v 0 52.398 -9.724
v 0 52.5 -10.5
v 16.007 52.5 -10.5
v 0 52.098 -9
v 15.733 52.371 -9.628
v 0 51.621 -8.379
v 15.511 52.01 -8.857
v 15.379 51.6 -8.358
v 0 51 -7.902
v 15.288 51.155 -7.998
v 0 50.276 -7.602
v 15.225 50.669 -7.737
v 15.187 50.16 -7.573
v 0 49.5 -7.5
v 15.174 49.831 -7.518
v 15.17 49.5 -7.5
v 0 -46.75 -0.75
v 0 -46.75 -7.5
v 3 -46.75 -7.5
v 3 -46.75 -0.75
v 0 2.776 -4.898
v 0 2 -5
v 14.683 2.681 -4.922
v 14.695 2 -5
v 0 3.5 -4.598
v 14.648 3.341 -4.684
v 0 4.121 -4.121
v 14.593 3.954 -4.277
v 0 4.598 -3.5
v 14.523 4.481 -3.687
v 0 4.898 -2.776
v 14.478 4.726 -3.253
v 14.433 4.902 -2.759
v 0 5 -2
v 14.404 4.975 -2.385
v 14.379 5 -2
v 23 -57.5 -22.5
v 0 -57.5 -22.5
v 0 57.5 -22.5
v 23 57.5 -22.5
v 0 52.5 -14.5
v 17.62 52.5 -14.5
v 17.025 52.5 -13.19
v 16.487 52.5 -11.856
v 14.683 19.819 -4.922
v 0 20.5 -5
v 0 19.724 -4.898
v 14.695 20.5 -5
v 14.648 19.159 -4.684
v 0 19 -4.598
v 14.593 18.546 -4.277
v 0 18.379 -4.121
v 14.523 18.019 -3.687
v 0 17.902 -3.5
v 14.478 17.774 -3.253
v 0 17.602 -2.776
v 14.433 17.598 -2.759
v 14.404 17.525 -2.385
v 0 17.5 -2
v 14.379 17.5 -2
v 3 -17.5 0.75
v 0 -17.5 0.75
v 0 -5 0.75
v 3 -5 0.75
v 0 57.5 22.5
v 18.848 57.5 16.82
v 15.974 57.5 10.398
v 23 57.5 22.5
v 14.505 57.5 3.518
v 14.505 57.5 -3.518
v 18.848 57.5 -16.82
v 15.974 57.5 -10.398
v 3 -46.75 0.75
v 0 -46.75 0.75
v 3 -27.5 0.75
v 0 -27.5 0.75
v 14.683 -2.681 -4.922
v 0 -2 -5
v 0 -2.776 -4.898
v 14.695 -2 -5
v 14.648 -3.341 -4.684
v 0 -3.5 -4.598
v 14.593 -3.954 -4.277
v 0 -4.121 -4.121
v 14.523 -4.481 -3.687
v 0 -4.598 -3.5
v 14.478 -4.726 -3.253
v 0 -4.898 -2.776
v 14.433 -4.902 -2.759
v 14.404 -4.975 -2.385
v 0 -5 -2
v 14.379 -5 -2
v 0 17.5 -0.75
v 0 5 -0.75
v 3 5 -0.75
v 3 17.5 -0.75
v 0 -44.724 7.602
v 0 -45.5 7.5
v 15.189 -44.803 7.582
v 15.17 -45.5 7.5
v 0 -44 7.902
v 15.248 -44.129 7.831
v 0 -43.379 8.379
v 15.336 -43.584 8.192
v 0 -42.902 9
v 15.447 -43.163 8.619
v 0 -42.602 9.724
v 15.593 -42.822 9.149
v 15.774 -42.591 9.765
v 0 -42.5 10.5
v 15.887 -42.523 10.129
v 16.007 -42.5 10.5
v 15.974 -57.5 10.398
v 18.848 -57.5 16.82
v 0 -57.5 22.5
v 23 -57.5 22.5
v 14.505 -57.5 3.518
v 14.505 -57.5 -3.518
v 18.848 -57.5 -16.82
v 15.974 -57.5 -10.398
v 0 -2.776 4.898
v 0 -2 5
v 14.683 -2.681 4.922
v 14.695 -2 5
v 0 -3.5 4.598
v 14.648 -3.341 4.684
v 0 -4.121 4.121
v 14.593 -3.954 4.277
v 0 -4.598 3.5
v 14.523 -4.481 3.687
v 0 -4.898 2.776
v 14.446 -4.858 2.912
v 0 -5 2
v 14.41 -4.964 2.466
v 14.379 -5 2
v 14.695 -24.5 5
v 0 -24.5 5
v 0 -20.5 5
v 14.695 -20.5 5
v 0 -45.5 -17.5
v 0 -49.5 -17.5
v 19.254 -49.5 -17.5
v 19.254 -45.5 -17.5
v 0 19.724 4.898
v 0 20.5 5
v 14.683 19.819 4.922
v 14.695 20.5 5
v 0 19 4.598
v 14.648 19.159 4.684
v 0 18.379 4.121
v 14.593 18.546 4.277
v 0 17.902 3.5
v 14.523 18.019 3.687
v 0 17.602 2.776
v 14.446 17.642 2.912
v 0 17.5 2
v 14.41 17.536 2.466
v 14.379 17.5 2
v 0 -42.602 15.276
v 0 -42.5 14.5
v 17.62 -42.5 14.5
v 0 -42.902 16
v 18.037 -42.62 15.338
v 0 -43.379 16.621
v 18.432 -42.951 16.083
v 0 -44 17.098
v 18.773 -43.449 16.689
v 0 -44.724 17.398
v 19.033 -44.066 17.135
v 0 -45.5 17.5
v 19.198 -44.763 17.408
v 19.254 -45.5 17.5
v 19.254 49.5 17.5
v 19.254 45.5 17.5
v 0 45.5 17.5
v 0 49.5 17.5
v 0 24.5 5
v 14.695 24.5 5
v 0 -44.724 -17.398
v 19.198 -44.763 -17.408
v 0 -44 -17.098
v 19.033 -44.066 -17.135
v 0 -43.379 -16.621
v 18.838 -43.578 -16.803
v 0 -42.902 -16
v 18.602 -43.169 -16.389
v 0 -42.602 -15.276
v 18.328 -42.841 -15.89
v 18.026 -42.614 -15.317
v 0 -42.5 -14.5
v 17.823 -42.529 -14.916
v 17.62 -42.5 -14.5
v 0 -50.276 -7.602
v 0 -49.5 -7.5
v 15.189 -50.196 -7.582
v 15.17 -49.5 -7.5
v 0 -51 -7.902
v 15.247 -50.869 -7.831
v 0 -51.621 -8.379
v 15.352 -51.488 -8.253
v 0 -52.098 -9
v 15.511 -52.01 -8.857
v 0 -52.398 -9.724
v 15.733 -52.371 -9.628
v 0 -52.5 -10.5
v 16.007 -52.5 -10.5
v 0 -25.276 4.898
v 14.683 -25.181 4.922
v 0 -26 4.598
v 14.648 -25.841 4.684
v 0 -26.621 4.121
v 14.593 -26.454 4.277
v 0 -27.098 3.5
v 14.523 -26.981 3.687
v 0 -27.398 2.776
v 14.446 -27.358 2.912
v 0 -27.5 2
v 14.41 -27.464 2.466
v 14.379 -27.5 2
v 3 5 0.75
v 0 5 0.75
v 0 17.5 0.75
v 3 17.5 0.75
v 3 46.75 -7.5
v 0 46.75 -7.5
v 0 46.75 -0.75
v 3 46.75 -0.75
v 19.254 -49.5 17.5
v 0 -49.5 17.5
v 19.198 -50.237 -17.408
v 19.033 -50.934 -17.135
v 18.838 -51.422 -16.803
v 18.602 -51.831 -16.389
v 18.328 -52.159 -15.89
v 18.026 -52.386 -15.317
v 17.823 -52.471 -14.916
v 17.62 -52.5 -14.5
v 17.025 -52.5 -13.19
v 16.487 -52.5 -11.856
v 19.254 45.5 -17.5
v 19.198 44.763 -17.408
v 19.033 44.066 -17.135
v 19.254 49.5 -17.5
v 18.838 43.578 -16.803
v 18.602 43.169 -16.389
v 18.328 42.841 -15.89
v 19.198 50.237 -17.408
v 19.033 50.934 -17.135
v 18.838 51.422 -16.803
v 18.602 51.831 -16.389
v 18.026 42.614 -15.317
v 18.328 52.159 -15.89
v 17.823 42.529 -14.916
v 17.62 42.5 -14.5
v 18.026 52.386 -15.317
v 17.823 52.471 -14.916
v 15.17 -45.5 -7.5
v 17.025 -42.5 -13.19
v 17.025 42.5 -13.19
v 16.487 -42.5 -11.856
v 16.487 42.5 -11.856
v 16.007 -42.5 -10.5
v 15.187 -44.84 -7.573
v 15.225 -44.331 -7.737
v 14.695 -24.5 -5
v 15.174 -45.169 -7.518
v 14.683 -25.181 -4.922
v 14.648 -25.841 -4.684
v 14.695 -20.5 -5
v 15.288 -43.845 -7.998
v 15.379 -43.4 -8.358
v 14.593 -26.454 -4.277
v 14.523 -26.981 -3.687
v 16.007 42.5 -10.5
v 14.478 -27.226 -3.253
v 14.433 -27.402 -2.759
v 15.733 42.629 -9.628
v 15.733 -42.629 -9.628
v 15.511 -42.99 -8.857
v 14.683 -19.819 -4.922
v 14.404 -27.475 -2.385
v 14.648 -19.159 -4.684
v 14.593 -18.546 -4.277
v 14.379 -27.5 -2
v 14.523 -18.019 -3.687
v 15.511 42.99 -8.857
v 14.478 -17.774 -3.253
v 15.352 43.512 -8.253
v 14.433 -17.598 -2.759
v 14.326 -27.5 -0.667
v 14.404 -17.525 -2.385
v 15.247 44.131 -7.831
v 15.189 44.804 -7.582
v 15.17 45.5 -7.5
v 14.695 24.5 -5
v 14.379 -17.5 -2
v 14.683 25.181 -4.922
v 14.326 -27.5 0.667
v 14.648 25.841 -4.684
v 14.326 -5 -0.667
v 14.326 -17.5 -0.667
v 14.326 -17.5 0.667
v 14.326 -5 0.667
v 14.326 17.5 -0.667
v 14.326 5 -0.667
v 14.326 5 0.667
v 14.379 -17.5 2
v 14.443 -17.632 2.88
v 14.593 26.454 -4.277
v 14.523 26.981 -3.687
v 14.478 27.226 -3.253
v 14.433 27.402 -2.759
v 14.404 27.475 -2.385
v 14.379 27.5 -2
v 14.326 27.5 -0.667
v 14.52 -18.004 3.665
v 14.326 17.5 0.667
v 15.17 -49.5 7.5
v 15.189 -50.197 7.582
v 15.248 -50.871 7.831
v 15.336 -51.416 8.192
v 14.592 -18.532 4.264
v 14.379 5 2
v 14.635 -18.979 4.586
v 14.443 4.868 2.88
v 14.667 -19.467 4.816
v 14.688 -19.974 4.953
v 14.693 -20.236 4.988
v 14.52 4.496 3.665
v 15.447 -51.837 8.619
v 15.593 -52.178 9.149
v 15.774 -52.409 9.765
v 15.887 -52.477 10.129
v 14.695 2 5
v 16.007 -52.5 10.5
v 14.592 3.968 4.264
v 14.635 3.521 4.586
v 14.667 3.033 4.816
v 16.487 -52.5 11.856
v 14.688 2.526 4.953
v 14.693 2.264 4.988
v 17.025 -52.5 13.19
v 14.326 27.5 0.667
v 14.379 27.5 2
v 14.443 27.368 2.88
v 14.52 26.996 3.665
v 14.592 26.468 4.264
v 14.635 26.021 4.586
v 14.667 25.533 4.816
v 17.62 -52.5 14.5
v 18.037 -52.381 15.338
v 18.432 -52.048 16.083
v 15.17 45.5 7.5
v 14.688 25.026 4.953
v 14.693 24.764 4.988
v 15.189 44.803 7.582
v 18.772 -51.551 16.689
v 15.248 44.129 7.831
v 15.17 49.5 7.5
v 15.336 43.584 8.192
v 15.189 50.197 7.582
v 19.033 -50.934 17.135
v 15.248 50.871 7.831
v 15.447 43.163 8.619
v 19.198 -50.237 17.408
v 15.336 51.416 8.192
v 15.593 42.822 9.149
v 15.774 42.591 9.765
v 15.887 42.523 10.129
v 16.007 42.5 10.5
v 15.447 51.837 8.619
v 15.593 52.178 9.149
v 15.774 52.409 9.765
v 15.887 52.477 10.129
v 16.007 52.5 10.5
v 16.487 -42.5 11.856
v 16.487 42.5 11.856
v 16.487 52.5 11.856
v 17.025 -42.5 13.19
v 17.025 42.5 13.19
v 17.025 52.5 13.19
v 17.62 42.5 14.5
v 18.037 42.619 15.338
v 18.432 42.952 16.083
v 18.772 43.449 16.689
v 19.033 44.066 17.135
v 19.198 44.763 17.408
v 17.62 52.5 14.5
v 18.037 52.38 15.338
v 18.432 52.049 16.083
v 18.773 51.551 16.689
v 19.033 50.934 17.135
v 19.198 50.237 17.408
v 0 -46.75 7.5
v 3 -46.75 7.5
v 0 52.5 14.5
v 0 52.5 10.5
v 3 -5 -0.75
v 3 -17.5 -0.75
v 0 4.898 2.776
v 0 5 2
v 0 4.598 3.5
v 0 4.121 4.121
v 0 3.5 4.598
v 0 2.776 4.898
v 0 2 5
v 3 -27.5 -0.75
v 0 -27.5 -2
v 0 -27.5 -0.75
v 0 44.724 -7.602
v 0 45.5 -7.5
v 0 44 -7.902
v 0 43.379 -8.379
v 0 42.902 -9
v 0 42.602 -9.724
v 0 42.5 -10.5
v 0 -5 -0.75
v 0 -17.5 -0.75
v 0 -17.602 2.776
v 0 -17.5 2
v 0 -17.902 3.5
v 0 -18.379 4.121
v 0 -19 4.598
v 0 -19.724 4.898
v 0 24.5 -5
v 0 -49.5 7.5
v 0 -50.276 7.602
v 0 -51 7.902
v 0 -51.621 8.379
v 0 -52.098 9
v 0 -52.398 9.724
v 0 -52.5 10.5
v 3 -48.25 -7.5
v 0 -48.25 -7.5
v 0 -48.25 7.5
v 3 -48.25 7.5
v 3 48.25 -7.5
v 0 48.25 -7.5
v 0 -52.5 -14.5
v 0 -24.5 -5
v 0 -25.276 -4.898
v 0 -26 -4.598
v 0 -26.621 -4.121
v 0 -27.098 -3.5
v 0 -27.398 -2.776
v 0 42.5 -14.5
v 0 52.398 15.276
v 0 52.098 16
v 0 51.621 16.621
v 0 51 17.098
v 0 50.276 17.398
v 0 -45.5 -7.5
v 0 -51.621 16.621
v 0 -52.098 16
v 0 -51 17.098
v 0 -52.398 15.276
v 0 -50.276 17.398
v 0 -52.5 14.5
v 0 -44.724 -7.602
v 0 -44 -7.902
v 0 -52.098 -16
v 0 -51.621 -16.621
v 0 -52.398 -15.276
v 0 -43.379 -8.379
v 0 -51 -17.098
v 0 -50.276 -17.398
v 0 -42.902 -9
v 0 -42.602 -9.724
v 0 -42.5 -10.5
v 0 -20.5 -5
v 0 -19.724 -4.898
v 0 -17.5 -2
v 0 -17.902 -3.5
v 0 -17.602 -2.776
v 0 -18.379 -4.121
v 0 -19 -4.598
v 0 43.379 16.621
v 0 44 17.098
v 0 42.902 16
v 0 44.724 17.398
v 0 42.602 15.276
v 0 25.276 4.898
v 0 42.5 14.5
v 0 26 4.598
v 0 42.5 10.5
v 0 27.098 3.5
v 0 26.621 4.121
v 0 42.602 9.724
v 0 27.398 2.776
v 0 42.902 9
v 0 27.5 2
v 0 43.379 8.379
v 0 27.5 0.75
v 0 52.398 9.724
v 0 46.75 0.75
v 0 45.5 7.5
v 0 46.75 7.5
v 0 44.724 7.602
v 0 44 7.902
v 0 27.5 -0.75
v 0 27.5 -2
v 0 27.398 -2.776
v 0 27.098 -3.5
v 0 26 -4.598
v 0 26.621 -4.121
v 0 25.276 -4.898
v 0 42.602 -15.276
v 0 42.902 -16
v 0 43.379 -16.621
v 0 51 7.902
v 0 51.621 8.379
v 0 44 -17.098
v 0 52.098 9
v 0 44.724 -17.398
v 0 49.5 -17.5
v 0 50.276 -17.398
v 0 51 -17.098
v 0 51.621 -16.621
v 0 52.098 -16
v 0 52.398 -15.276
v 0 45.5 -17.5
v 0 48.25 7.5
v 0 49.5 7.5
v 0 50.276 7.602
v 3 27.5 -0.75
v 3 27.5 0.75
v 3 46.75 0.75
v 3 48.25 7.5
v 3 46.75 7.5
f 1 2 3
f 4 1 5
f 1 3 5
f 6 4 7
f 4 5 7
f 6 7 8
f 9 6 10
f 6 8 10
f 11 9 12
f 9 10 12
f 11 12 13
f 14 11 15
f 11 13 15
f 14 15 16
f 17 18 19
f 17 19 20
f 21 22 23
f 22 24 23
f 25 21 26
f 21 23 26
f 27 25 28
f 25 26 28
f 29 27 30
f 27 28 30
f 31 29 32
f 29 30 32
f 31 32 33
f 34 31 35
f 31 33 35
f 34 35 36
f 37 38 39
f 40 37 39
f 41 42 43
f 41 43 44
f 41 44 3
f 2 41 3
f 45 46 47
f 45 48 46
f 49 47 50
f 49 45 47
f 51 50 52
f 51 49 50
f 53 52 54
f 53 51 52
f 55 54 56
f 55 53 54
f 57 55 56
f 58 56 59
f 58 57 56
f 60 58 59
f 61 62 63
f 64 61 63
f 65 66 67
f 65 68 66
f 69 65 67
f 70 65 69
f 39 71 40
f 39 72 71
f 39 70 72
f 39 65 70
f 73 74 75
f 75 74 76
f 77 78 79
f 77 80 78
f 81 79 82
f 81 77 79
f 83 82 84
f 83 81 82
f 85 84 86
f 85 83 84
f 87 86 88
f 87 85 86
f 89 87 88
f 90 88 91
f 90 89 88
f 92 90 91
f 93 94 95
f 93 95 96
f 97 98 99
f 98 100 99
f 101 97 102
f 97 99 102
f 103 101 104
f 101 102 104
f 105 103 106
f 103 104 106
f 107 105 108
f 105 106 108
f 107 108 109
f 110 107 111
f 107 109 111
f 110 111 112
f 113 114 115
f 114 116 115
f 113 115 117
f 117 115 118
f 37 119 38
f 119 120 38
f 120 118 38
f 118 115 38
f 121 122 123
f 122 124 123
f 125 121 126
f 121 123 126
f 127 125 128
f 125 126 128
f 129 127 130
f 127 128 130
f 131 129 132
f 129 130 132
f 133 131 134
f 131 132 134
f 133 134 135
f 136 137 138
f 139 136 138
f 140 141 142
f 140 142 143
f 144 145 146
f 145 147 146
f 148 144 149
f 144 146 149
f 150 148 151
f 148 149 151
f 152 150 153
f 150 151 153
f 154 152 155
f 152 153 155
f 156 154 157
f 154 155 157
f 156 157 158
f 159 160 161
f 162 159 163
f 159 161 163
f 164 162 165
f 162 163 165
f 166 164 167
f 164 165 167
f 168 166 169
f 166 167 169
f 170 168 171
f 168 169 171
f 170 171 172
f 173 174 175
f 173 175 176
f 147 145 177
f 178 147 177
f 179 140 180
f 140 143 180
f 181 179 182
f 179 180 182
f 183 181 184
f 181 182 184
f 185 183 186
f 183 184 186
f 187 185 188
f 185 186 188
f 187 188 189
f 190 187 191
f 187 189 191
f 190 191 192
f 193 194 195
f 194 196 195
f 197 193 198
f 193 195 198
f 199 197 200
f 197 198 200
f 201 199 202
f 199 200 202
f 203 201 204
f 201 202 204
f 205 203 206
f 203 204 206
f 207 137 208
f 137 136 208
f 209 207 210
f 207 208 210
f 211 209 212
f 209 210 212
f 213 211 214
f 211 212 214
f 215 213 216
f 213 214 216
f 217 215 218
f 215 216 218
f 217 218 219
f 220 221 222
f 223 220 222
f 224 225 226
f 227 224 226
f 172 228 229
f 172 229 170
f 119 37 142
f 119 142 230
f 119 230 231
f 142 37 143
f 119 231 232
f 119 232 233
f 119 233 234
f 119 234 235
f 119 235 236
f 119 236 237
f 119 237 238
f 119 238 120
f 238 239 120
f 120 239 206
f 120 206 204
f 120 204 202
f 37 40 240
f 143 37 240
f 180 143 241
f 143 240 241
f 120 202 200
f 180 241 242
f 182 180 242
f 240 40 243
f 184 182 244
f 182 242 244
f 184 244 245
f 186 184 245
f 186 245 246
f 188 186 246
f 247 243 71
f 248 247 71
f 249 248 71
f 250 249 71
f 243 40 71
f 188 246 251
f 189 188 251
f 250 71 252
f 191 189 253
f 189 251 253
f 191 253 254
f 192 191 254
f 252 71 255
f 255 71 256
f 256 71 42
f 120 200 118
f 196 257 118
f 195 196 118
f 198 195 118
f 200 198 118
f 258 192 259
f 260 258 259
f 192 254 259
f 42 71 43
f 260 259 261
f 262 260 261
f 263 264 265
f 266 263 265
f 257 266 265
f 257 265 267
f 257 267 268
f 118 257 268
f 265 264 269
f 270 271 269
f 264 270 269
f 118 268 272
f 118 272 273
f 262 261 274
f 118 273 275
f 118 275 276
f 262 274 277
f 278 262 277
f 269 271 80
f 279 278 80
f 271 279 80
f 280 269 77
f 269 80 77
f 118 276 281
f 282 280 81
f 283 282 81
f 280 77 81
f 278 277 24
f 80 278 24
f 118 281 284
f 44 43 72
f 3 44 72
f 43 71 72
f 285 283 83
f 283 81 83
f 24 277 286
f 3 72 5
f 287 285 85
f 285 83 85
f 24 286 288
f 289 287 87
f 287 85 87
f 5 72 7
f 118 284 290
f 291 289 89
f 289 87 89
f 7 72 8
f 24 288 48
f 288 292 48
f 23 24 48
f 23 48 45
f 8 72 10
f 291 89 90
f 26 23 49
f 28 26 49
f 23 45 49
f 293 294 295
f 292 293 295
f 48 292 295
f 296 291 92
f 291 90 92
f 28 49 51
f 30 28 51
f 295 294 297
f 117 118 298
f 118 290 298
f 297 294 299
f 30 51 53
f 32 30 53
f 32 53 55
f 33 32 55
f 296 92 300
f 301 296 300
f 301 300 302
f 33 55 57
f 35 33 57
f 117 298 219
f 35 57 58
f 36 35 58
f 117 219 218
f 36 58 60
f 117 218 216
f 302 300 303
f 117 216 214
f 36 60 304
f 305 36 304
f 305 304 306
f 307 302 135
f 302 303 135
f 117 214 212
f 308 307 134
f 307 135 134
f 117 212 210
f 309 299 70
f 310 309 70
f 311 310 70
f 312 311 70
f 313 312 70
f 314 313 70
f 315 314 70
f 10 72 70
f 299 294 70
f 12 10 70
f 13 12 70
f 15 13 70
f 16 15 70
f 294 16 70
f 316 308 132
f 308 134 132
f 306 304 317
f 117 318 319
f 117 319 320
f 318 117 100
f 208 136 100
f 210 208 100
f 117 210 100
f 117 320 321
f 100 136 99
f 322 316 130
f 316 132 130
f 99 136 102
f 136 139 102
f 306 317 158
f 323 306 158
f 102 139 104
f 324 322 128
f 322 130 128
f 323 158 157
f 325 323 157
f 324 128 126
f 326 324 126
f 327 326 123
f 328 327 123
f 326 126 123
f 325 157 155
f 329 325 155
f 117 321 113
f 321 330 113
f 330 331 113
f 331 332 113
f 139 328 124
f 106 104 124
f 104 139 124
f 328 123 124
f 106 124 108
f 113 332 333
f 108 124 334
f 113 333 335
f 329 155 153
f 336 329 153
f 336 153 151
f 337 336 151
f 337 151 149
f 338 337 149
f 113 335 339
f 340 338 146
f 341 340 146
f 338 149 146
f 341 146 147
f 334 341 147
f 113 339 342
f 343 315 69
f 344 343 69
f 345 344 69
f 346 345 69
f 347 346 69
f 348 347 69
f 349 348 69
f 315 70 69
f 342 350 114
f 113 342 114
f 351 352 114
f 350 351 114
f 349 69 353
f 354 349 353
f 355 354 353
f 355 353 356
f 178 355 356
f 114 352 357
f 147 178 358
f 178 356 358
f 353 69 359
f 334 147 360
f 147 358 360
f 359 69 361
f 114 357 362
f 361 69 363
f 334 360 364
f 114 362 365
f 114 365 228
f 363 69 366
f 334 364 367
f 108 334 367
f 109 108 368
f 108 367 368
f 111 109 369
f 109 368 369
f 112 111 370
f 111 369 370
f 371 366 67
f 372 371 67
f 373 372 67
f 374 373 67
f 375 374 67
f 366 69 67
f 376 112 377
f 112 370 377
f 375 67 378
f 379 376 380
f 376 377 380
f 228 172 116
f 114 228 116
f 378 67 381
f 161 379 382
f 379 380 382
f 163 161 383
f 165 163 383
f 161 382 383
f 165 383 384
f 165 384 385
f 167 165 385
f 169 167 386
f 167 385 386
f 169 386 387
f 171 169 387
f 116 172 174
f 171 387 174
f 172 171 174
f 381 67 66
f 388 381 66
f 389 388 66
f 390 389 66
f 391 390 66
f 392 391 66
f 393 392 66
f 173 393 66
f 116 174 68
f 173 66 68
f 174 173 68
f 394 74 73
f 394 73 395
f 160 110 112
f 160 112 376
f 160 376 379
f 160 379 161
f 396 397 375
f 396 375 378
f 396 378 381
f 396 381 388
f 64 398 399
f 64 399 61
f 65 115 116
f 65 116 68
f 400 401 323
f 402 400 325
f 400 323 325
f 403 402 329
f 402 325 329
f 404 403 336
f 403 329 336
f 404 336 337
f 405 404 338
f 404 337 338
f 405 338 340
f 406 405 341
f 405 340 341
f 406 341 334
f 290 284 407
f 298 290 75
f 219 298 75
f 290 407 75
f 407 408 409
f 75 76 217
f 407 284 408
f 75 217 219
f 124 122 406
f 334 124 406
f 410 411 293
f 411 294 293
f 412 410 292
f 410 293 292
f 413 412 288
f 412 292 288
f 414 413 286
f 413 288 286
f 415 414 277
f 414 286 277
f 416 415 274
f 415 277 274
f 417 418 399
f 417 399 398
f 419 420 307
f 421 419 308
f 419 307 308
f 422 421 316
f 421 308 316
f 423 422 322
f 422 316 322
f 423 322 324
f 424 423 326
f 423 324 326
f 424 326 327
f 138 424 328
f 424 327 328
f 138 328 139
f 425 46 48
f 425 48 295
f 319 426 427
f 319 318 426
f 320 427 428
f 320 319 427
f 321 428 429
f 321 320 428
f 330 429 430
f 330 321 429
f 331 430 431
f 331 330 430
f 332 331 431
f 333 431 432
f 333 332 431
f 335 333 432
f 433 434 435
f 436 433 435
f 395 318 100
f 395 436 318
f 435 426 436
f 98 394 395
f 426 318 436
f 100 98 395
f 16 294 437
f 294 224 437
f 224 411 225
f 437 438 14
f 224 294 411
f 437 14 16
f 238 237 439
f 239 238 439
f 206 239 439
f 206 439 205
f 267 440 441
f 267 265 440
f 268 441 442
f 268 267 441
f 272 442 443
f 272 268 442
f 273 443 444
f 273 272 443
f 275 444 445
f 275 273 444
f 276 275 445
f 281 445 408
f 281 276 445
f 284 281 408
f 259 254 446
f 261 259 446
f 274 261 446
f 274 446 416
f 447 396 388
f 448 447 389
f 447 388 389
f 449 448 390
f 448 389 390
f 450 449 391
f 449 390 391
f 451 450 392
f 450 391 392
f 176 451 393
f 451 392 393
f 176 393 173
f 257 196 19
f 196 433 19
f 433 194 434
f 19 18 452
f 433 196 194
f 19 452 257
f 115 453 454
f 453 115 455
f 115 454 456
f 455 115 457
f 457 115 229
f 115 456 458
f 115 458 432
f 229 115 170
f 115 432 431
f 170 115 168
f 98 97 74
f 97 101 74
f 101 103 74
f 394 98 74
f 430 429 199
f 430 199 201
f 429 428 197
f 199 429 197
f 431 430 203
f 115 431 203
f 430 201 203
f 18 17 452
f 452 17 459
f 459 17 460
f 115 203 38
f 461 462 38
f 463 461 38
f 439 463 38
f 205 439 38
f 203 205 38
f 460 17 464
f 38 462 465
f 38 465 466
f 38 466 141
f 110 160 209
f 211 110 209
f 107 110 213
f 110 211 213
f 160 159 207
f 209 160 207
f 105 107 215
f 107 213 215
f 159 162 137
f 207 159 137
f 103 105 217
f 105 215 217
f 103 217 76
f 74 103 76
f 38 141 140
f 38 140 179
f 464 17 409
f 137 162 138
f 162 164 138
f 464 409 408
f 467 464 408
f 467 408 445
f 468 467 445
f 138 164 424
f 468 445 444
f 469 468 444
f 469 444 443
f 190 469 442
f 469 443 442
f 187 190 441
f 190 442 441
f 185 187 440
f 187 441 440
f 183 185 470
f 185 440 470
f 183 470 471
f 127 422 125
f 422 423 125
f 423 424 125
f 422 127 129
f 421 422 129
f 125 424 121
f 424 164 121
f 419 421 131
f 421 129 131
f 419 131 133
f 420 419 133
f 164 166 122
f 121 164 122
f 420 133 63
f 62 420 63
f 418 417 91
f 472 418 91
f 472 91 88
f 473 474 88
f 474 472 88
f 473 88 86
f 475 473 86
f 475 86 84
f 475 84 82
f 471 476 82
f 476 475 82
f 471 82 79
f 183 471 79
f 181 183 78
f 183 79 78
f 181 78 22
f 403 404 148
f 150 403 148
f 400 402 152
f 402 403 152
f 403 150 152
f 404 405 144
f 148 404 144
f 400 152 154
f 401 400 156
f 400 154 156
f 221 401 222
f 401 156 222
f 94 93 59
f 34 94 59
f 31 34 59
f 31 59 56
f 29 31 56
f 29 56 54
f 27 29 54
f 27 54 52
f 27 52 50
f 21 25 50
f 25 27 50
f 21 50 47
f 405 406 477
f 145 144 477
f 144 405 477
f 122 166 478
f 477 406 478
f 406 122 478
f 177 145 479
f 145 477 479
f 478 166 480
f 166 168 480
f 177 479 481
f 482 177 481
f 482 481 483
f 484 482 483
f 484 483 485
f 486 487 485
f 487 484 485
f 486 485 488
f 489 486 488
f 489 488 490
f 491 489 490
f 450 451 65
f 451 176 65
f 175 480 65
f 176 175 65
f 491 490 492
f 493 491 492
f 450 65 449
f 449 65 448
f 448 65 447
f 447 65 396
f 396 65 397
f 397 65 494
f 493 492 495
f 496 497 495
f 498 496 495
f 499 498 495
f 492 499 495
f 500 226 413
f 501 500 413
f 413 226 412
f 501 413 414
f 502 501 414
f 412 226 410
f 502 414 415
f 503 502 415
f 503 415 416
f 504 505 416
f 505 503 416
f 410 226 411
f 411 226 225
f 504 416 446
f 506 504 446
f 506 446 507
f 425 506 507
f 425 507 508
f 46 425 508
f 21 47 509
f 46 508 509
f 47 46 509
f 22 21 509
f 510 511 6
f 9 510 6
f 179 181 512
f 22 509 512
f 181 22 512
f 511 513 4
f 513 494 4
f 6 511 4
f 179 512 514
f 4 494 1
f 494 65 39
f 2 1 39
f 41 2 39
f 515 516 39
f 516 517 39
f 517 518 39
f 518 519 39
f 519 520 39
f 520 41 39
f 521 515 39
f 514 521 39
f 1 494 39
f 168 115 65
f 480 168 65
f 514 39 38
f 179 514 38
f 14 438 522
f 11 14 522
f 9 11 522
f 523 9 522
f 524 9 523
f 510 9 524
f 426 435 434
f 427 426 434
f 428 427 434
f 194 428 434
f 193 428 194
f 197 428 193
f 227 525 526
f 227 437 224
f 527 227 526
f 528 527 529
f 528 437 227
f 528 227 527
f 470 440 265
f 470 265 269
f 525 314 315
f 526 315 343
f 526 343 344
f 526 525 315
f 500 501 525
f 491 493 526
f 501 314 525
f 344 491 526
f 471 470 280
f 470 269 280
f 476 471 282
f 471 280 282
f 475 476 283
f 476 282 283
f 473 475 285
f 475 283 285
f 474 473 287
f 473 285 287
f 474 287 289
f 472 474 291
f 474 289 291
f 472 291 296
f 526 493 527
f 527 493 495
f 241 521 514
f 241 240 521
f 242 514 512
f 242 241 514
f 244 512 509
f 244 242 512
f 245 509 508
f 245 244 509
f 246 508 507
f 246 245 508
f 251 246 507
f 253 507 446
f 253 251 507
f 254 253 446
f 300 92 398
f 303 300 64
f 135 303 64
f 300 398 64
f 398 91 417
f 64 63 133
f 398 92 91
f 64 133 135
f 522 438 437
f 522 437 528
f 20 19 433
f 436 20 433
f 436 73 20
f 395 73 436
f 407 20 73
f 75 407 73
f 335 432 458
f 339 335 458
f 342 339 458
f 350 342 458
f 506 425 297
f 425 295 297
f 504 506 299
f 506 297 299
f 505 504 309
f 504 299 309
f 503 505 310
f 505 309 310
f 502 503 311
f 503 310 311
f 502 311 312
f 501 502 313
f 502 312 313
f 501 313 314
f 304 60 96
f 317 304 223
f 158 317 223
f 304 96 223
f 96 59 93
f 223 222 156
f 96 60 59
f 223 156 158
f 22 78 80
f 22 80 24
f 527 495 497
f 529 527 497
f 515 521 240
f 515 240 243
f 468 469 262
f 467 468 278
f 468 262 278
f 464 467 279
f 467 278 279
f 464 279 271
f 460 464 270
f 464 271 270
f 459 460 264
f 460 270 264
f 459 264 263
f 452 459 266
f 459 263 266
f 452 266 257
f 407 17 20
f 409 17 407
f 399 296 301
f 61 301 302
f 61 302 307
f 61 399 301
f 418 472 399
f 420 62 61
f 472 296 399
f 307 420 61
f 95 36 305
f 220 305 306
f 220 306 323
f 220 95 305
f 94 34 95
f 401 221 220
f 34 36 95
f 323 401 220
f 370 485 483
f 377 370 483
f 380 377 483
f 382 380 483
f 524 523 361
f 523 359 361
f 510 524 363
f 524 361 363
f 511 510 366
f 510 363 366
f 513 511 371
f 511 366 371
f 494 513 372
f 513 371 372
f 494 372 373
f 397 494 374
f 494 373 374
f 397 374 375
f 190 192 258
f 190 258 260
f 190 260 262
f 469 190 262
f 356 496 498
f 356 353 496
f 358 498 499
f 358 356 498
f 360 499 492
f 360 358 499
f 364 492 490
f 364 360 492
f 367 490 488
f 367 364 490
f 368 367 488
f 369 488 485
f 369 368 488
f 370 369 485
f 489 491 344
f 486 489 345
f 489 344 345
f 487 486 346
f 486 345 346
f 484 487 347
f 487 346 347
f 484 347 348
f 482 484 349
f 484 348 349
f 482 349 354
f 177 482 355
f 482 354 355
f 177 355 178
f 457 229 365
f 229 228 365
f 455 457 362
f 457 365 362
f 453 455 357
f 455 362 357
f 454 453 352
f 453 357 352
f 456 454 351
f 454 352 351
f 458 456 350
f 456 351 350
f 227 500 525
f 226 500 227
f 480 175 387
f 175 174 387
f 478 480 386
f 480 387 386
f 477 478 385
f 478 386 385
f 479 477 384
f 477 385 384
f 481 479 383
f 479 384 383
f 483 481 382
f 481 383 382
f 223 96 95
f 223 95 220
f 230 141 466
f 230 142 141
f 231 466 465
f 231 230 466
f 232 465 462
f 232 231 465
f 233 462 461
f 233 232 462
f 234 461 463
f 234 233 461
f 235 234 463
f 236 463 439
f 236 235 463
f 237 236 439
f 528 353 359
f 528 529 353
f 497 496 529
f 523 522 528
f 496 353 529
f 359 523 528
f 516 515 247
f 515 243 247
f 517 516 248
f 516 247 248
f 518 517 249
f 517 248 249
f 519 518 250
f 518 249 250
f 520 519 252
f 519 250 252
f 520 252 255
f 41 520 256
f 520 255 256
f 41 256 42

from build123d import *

# Parameters (mm, degrees)
SKETCH1_W           = 45
SKETCH1_H           = 115
BOSS_EXTRUDE1_DEPTH = 23
SKETCH2_R           = 33.5
CUT_EXTRUDE1_DEPTH  = 121
SKETCH3_W           = 10
SKETCH3_H           = 10
CUT_EXTRUDE3_DEPTH  = 31
FILLET2_R           = 3
FILLET3_R           = 3
SKETCH5_W           = 15
SKETCH5_H           = 1.5
SKETCH5_W_2         = 1.5
SKETCH5_H_2         = 12.5
SKETCH5_H_3         = 19.25
CUT_EXTRUDE4_DEPTH  = 3


with BuildPart() as part:
    # Sketch1 → Boss-Extrude1 (new body)
    with BuildSketch(Plane(origin=(0, 0, 0), x_dir=(0, 0, -1), z_dir=(1, 0, 0))):
        Rectangle(SKETCH1_W, SKETCH1_H)
    extrude(amount=BOSS_EXTRUDE1_DEPTH)

    # Sketch2 → Cut-Extrude1 (cut)
    with BuildSketch(Plane(origin=(0, 57.5, 0), x_dir=(1, 0, 0), z_dir=(0, 1, 0))):
        with Locations((47.819347292, 0)):
            Circle(SKETCH2_R)
    extrude(amount=-CUT_EXTRUDE1_DEPTH, mode=Mode.SUBTRACT)

    # Sketch3 → Cut-Extrude3 (cut)
    with BuildSketch(Plane.ZY):
        with Locations((12.5, -47.5)):
            Rectangle(SKETCH3_W, SKETCH3_H)
        with Locations((-12.5, -47.5)):
            Rectangle(SKETCH3_W, SKETCH3_H)
        with Locations((0, -22.5)):
            Rectangle(SKETCH3_W, SKETCH3_H)
        Rectangle(SKETCH3_W, SKETCH3_H)
        with Locations((0, 22.5)):
            Rectangle(SKETCH3_W, SKETCH3_H)
        with Locations((12.5, 47.5)):
            Rectangle(SKETCH3_W, SKETCH3_H)
        with Locations((-12.5, 47.5)):
            Rectangle(SKETCH3_W, SKETCH3_H)
    extrude(amount=-CUT_EXTRUDE3_DEPTH, mode=Mode.SUBTRACT)

    # Fillet2
    fillet2_edges = [part.edges().sort_by_distance(p)[0] for p in [
        (9.626816789, -42.5, 17.5),
        (9.626816789, -52.5, 17.5),
        (7.584845929, -42.5, 7.5),
        (7.584845929, 52.5, -7.5),
        (7.584845929, 42.5, -7.5),
        (9.626816789, 42.5, -17.5),
        (9.626816789, 52.5, -17.5),
        (9.626816789, 52.5, 17.5),
        (9.626816789, 42.5, 17.5),
        (7.584845929, 42.5, 7.5),
        (7.584845929, 52.5, 7.5),
        (7.347291571, 27.5, 5),
        (7.347291571, 17.5, 5),
        (7.347291571, 17.5, -5),
        (7.347291571, 27.5, -5),
        (7.347291571, 5, 5),
        (7.347291571, -5, 5),
        (7.347291571, -5, -5),
        (7.347291571, 5, -5),
        (7.347291571, -17.5, 5),
        (7.347291571, -27.5, 5),
        (7.347291571, -27.5, -5),
        (7.347291571, -17.5, -5),
        (7.584845929, -42.5, -7.5),
        (7.584845929, -52.5, -7.5),
        (9.626816789, -52.5, -17.5),
        (9.626816789, -42.5, -17.5),
    ]]
    fillet(fillet2_edges, radius=FILLET2_R)

    # Fillet3
    fillet3_edges = [part.edges().sort_by_distance(p)[0] for p in [
        (7.584845929, -52.5, 7.5),
    ]]
    fillet(fillet3_edges, radius=FILLET3_R)

    # Sketch5 → Cut-Extrude4 (cut)
    with BuildSketch(Plane.ZY):
        with Locations((0, -47.5)):
            Rectangle(SKETCH5_W, SKETCH5_H)
        with Locations((0, -11.25)):
            Rectangle(SKETCH5_W_2, SKETCH5_H_2)
        with Locations((0, -37.125)):
            Rectangle(SKETCH5_W_2, SKETCH5_H_3)
        with Locations((0, 11.25)):
            Rectangle(SKETCH5_W_2, SKETCH5_H_2)
        with Locations((0, 37.125)):
            Rectangle(SKETCH5_W_2, SKETCH5_H_3)
        with Locations((0, 47.5)):
            Rectangle(SKETCH5_W, SKETCH5_H)
    extrude(amount=-CUT_EXTRUDE4_DEPTH, mode=Mode.SUBTRACT)


solid = part.part
